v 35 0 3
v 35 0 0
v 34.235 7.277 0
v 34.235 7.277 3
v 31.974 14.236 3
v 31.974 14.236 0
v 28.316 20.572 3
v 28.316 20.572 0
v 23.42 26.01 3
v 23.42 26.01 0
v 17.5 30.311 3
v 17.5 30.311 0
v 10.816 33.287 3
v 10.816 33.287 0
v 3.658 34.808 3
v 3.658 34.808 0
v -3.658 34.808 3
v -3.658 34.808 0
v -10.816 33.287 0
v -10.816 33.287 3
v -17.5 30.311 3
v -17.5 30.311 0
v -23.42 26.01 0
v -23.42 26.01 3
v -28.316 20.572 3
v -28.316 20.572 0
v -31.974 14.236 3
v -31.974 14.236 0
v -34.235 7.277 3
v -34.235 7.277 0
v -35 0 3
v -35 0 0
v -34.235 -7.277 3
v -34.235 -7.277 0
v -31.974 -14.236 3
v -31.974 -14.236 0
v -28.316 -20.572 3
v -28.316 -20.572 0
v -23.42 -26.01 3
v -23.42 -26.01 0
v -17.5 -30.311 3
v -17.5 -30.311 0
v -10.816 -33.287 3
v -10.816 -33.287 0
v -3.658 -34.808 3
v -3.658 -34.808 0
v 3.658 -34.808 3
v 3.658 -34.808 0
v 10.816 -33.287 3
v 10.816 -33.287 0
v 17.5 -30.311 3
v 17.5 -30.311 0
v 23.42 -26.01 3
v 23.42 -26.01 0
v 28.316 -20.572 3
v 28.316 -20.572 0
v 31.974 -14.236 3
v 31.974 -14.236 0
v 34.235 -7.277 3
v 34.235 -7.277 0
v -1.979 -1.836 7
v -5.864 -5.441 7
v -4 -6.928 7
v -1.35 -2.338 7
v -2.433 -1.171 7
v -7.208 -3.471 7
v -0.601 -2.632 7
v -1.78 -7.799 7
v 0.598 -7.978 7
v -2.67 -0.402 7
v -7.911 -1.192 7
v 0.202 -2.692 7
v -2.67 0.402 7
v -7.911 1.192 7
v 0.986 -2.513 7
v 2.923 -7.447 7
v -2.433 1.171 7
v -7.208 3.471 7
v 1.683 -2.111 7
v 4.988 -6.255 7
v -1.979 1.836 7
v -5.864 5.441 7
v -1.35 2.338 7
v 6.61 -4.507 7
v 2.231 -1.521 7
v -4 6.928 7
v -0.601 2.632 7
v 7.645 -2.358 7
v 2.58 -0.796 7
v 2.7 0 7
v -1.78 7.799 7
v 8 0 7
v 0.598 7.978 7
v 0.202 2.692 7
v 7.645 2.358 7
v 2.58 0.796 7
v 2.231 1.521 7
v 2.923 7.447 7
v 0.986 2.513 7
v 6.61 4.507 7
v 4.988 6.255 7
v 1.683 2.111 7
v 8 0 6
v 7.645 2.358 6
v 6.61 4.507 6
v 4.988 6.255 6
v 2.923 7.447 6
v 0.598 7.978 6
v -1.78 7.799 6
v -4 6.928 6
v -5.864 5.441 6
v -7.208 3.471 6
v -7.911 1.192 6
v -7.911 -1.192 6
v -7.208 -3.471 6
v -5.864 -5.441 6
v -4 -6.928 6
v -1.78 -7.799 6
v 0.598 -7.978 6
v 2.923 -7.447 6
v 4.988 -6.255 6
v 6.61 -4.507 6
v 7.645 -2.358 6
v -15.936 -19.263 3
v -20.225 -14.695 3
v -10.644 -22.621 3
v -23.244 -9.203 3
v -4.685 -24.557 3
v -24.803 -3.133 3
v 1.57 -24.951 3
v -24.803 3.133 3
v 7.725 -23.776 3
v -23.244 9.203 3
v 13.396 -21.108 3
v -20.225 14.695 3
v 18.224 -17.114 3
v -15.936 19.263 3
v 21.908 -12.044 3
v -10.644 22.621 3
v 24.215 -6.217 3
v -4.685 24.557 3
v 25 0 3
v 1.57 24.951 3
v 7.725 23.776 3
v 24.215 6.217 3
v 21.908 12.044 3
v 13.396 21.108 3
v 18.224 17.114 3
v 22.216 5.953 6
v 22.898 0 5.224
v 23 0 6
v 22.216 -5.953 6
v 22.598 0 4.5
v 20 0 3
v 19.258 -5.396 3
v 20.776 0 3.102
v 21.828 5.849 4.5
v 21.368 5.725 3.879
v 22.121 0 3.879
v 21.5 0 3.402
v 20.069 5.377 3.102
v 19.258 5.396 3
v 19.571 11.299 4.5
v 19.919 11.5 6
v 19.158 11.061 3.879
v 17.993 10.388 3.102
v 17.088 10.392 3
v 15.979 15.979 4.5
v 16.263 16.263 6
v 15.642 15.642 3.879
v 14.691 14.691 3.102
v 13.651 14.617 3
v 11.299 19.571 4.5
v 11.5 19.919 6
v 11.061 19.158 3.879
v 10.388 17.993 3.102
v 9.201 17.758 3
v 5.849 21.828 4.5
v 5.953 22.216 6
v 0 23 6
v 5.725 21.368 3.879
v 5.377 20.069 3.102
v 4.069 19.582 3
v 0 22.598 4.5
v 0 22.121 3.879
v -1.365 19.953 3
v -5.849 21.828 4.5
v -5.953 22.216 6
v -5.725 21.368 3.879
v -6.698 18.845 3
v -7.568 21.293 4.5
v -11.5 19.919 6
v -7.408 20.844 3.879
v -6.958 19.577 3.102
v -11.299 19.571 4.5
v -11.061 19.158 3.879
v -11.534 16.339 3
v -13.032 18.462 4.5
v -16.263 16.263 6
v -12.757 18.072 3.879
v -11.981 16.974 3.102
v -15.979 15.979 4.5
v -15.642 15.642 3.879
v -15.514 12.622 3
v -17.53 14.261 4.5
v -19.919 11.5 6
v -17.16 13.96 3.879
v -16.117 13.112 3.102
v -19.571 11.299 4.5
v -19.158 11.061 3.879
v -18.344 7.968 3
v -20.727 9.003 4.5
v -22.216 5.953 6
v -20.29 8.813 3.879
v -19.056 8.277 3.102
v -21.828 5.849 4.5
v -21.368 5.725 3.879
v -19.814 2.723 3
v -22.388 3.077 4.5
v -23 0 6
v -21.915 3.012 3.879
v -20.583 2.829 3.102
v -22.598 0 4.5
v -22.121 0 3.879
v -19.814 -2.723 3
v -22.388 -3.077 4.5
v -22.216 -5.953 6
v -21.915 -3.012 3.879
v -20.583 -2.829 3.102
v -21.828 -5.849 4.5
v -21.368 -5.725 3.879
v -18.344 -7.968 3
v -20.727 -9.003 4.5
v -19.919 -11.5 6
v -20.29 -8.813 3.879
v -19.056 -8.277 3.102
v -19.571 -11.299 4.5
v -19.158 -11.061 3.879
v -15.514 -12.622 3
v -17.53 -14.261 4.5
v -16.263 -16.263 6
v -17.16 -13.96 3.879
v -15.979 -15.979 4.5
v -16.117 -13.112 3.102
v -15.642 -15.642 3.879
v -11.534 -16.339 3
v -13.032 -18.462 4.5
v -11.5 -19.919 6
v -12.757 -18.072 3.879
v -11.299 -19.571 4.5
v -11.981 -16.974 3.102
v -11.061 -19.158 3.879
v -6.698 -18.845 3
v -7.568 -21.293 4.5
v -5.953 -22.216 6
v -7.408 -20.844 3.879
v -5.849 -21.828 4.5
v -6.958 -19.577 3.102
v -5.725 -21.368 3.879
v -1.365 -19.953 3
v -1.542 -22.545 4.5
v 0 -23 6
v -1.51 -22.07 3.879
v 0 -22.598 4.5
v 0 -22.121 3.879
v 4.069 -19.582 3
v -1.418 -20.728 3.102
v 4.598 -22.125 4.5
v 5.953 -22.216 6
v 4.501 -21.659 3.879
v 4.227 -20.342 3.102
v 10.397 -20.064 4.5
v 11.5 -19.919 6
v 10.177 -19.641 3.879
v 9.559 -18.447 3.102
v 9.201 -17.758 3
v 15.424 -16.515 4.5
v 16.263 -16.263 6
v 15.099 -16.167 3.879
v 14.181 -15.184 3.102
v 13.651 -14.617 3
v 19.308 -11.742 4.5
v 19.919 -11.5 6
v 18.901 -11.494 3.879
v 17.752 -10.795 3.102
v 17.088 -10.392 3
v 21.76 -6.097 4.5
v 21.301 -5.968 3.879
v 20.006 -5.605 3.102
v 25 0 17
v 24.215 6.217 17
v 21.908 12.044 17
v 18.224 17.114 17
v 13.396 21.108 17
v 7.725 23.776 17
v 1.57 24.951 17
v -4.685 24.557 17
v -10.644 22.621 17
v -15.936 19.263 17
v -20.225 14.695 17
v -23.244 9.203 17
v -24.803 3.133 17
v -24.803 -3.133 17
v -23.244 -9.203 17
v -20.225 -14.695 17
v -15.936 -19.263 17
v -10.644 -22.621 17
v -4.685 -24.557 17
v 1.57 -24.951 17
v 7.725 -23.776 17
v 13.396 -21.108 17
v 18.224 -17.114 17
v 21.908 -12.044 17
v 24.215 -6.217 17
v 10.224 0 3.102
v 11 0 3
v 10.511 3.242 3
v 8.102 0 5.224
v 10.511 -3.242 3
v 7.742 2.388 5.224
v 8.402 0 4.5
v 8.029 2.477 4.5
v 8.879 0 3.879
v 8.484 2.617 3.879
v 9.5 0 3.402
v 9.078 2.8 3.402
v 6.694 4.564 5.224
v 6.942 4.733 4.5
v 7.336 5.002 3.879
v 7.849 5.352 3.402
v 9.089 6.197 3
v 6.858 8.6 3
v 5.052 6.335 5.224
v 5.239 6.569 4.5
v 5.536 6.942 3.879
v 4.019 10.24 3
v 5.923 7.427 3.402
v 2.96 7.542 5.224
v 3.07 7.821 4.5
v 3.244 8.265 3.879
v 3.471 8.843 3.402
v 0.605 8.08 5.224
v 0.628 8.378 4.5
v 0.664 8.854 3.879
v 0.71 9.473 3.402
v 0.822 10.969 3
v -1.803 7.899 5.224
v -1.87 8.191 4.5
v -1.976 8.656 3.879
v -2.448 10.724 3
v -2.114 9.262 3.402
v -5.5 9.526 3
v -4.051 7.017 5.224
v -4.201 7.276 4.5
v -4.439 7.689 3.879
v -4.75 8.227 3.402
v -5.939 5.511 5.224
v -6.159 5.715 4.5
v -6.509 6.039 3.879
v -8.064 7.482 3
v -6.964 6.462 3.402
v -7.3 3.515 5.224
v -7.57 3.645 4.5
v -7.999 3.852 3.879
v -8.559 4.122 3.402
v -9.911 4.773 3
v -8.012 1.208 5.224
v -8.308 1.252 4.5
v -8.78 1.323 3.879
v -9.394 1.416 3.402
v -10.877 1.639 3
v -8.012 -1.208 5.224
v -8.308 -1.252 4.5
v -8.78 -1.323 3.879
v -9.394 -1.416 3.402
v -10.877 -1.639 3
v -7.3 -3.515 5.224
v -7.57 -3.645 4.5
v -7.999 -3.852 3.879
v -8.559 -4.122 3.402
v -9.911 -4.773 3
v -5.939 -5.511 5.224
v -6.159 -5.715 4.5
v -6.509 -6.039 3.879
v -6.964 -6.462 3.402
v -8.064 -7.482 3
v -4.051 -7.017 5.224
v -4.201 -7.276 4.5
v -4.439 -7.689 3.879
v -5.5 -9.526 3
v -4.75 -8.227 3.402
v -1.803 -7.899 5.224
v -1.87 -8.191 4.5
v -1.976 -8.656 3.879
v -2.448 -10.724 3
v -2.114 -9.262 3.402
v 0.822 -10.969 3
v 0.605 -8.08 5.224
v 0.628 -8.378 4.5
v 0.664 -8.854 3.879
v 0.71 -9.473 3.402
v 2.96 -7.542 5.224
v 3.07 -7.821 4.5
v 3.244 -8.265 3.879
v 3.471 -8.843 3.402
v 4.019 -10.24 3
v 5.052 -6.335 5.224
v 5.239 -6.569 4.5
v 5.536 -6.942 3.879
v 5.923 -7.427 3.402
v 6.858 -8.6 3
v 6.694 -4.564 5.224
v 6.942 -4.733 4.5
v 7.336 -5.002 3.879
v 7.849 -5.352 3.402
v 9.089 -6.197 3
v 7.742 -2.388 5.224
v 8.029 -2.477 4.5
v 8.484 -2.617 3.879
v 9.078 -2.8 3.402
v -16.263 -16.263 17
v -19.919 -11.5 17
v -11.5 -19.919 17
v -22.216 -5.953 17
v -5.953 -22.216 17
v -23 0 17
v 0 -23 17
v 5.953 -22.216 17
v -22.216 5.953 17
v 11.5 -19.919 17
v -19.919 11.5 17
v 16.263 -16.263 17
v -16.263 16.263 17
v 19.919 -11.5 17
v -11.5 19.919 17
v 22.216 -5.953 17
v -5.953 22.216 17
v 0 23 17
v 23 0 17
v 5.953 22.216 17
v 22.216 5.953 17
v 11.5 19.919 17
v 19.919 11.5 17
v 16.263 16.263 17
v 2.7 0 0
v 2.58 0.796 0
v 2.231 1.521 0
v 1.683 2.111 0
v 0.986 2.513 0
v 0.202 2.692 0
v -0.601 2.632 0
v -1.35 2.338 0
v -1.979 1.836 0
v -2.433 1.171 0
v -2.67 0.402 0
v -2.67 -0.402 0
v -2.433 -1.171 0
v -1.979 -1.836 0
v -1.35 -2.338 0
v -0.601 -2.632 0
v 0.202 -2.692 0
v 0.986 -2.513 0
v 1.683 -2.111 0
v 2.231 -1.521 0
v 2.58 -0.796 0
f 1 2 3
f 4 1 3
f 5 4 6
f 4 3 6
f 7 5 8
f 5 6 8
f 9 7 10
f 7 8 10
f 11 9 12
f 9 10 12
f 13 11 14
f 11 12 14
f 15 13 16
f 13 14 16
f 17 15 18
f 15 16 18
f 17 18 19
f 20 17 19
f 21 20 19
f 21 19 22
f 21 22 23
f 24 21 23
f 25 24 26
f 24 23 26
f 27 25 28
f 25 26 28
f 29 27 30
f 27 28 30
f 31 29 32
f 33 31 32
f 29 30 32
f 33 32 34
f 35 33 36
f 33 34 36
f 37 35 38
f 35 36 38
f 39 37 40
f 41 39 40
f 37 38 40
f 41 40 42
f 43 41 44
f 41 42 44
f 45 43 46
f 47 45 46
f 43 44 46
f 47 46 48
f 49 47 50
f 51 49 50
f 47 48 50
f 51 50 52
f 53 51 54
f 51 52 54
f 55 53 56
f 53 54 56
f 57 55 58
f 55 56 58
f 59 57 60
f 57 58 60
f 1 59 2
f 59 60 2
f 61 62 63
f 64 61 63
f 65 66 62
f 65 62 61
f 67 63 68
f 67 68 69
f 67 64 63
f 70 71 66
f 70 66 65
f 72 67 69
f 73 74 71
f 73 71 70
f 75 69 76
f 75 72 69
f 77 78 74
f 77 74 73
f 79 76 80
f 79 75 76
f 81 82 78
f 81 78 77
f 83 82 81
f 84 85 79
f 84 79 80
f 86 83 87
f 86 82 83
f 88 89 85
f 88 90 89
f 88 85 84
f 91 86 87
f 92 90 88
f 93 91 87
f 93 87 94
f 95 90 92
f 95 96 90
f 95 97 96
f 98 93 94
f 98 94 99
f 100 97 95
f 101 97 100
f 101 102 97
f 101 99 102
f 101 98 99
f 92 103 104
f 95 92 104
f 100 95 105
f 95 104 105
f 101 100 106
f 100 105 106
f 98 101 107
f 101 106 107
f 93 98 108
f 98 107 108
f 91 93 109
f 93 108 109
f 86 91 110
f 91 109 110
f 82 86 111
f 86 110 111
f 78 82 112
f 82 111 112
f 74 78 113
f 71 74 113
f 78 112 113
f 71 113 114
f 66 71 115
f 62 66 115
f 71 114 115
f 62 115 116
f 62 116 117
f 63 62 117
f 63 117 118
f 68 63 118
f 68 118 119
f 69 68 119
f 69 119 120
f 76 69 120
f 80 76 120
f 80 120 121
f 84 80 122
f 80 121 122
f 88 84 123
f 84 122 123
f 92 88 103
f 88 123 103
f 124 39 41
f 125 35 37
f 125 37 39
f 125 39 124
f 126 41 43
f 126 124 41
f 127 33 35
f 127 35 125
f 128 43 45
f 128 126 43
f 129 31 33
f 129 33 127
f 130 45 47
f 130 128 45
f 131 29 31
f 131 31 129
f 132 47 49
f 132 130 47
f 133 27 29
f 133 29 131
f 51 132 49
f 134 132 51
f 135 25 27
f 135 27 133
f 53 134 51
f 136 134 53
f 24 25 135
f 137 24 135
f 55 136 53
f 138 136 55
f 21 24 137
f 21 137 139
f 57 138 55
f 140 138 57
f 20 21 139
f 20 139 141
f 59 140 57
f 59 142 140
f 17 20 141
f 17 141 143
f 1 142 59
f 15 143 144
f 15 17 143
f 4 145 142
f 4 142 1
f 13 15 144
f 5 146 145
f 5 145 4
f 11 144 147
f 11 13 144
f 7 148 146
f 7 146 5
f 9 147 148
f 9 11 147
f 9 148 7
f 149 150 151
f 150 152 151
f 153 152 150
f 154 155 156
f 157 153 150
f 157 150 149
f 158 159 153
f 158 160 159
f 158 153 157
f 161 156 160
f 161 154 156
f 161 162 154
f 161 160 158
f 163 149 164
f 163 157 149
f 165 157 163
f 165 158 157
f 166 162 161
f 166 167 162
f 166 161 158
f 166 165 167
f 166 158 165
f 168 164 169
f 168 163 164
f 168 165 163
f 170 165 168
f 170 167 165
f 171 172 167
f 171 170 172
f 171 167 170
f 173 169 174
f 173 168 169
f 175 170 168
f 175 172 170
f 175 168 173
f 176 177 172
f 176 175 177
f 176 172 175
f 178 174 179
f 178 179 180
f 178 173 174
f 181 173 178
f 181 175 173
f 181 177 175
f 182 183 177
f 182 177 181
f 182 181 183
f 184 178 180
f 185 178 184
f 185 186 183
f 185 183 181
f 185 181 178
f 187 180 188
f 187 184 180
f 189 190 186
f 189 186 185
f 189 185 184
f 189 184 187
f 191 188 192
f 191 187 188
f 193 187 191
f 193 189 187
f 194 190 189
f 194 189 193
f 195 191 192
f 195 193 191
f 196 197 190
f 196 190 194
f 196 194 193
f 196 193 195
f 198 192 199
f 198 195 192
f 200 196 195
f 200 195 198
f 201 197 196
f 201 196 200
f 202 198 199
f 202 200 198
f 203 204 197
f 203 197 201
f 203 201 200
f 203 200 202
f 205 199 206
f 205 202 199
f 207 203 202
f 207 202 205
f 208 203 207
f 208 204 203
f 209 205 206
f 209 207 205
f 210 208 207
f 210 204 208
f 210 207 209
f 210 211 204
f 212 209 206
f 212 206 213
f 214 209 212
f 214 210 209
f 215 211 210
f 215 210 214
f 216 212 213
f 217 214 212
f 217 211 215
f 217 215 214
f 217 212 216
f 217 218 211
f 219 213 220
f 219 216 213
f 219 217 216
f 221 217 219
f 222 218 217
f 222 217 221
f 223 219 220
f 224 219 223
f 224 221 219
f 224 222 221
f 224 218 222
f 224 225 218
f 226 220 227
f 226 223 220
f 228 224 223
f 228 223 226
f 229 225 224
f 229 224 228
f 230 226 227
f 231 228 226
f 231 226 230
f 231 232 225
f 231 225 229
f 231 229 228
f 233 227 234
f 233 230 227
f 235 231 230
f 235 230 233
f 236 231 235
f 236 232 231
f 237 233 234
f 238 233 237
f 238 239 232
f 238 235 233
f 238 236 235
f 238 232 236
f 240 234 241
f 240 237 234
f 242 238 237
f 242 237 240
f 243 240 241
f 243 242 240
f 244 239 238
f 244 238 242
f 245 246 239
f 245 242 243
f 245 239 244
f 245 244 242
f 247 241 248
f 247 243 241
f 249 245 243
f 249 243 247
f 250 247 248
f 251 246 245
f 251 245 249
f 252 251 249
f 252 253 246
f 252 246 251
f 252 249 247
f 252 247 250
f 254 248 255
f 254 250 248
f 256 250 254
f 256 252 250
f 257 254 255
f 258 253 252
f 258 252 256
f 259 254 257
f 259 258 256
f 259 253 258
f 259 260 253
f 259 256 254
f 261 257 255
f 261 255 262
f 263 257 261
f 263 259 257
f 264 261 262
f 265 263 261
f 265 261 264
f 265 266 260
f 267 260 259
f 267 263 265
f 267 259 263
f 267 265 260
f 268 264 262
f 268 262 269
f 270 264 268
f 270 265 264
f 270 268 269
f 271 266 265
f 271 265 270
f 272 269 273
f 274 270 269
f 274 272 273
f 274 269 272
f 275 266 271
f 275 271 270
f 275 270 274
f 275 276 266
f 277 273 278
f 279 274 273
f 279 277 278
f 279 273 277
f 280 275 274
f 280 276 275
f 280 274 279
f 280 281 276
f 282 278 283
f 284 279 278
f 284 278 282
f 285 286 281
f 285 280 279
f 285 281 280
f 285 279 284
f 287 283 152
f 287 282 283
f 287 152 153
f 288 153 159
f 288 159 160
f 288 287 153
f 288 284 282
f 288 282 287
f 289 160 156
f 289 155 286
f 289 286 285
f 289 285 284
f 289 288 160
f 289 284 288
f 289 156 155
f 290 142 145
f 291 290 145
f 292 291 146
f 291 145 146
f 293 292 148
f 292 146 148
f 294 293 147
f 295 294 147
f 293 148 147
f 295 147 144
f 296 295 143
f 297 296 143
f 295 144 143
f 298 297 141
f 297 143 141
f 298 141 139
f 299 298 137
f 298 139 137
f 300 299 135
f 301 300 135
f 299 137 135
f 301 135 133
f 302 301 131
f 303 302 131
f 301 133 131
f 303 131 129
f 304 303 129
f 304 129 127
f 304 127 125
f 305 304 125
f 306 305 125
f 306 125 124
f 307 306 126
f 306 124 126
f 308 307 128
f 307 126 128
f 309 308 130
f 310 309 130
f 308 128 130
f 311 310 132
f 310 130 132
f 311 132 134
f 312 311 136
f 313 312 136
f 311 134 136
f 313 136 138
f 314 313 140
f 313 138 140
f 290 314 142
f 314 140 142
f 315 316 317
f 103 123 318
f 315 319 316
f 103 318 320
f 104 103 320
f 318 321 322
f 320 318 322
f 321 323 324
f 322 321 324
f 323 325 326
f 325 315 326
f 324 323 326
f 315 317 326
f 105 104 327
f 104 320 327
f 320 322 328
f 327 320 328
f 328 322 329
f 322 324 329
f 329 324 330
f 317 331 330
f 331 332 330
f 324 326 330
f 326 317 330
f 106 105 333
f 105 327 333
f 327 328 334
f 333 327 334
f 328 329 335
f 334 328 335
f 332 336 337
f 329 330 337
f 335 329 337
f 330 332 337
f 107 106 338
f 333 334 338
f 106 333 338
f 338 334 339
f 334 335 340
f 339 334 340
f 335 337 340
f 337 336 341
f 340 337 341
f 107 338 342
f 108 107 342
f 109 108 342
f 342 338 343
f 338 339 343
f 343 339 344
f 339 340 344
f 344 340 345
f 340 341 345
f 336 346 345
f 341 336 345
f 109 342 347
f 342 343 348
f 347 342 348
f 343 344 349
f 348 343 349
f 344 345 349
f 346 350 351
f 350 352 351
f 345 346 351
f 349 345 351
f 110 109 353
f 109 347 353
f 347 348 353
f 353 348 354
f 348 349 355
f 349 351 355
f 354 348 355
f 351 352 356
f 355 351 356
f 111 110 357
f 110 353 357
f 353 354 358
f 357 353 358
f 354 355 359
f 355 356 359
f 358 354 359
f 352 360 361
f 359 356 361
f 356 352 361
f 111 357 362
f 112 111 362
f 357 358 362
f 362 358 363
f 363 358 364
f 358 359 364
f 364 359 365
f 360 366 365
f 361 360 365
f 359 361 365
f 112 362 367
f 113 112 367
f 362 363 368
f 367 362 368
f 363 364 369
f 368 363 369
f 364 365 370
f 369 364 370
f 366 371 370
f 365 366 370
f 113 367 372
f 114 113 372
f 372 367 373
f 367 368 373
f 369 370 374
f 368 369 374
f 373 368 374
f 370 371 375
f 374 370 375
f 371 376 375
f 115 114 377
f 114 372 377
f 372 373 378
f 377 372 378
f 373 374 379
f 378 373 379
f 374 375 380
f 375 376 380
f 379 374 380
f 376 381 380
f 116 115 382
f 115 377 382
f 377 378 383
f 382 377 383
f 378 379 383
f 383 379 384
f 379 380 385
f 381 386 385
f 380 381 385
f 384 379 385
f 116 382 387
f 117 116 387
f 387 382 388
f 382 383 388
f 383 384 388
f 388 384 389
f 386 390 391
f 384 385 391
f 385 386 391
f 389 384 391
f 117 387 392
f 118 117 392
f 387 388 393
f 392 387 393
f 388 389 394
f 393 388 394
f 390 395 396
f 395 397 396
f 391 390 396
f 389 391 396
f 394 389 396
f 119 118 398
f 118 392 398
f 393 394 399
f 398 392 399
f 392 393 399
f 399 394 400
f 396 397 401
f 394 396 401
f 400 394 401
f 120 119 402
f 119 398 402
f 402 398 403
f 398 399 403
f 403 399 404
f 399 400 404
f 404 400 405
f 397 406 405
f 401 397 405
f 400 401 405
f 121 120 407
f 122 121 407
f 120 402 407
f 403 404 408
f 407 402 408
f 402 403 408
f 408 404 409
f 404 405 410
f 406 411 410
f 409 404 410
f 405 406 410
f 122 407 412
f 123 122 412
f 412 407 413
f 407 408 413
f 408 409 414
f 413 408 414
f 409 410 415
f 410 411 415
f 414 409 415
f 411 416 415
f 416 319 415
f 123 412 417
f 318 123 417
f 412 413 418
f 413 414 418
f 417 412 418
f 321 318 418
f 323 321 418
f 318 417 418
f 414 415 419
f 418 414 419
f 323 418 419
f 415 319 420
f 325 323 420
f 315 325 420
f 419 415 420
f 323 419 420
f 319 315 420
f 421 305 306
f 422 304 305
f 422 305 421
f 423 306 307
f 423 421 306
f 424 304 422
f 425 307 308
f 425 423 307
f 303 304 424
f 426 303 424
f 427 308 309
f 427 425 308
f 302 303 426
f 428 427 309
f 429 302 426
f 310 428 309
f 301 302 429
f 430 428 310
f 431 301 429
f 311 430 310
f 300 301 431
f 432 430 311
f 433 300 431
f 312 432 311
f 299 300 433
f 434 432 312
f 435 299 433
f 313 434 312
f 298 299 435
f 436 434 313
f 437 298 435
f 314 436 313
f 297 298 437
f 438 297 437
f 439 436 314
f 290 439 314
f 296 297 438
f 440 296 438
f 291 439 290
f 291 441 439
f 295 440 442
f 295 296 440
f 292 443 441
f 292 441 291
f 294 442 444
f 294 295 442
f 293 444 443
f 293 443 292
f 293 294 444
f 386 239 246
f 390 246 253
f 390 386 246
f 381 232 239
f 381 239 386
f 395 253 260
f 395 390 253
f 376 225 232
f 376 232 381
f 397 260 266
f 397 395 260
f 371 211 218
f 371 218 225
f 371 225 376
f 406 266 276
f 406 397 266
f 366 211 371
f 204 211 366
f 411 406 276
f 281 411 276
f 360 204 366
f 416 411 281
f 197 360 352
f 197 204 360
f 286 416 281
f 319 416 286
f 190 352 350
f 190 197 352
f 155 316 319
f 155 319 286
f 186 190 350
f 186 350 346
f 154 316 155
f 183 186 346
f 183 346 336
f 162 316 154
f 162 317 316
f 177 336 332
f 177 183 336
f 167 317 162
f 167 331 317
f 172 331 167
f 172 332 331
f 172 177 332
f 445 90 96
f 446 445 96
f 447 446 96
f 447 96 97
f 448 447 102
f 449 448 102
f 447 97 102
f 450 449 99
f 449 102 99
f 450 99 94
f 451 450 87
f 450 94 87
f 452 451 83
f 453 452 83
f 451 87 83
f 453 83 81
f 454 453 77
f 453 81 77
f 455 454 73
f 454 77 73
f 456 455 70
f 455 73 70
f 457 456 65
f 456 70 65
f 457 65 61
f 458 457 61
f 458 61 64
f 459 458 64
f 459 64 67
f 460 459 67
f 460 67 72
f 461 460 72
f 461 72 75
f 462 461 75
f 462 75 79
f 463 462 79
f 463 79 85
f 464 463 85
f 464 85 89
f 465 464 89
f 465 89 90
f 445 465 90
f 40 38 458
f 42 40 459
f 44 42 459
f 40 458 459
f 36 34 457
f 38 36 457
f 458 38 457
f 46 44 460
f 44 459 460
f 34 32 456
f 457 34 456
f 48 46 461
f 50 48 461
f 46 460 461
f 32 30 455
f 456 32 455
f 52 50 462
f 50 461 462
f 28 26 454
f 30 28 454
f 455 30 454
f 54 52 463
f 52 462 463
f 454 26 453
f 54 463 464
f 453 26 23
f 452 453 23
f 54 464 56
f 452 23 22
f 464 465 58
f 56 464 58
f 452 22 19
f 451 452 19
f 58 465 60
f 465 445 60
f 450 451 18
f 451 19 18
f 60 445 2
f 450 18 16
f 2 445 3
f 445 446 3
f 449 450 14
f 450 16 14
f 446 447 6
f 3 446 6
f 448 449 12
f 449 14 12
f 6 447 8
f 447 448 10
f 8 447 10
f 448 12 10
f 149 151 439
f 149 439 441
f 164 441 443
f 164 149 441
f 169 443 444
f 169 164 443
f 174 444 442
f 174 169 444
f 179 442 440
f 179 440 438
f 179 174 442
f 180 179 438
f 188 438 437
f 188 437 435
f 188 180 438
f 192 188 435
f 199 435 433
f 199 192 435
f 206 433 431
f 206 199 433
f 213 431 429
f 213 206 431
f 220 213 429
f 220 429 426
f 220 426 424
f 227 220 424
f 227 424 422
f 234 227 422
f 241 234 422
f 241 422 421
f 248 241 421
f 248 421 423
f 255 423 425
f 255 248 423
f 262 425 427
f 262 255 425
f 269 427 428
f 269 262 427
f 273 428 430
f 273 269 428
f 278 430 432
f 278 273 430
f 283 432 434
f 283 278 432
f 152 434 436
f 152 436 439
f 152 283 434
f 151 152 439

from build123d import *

# Parameters (mm, degrees)
F0_R     = 35
F1_DEPTH = 3
F2_R     = 25
F2_R_2   = 23
F3_DEPTH = 14
F4_R     = 8
F5_DEPTH = 4
F6_R     = 2.7
F7_DEPTH = 25
F8_R     = 3


with BuildPart() as f1:
    # F0 (on Top) → F1 (new body)
    with BuildSketch(Plane.XY):
        Circle(F0_R)
    extrude(amount=F1_DEPTH)

    # F2 (on face) → F3 (join)
    with BuildSketch(Plane.XY.offset(3)):
        Circle(F2_R)
        Circle(F2_R_2, mode=Mode.SUBTRACT)
    extrude(amount=F3_DEPTH)

    # F4 (on face) → F5 (join)
    with BuildSketch(Plane.XY.offset(3)):
        Circle(F4_R)
    extrude(amount=F5_DEPTH)

    # F6 (on face) → F7 (cut)
    with BuildSketch(Plane.XY.offset(7)):
        Circle(F6_R)
    extrude(amount=-F7_DEPTH, mode=Mode.SUBTRACT)

    # F8
    f8_edges = [f1.edges().sort_by_distance(p)[0] for p in [
        (-23, 0, 3),
        (-8, 0, 3),
    ]]
    fillet(f8_edges, radius=F8_R)


solid = f1.part
